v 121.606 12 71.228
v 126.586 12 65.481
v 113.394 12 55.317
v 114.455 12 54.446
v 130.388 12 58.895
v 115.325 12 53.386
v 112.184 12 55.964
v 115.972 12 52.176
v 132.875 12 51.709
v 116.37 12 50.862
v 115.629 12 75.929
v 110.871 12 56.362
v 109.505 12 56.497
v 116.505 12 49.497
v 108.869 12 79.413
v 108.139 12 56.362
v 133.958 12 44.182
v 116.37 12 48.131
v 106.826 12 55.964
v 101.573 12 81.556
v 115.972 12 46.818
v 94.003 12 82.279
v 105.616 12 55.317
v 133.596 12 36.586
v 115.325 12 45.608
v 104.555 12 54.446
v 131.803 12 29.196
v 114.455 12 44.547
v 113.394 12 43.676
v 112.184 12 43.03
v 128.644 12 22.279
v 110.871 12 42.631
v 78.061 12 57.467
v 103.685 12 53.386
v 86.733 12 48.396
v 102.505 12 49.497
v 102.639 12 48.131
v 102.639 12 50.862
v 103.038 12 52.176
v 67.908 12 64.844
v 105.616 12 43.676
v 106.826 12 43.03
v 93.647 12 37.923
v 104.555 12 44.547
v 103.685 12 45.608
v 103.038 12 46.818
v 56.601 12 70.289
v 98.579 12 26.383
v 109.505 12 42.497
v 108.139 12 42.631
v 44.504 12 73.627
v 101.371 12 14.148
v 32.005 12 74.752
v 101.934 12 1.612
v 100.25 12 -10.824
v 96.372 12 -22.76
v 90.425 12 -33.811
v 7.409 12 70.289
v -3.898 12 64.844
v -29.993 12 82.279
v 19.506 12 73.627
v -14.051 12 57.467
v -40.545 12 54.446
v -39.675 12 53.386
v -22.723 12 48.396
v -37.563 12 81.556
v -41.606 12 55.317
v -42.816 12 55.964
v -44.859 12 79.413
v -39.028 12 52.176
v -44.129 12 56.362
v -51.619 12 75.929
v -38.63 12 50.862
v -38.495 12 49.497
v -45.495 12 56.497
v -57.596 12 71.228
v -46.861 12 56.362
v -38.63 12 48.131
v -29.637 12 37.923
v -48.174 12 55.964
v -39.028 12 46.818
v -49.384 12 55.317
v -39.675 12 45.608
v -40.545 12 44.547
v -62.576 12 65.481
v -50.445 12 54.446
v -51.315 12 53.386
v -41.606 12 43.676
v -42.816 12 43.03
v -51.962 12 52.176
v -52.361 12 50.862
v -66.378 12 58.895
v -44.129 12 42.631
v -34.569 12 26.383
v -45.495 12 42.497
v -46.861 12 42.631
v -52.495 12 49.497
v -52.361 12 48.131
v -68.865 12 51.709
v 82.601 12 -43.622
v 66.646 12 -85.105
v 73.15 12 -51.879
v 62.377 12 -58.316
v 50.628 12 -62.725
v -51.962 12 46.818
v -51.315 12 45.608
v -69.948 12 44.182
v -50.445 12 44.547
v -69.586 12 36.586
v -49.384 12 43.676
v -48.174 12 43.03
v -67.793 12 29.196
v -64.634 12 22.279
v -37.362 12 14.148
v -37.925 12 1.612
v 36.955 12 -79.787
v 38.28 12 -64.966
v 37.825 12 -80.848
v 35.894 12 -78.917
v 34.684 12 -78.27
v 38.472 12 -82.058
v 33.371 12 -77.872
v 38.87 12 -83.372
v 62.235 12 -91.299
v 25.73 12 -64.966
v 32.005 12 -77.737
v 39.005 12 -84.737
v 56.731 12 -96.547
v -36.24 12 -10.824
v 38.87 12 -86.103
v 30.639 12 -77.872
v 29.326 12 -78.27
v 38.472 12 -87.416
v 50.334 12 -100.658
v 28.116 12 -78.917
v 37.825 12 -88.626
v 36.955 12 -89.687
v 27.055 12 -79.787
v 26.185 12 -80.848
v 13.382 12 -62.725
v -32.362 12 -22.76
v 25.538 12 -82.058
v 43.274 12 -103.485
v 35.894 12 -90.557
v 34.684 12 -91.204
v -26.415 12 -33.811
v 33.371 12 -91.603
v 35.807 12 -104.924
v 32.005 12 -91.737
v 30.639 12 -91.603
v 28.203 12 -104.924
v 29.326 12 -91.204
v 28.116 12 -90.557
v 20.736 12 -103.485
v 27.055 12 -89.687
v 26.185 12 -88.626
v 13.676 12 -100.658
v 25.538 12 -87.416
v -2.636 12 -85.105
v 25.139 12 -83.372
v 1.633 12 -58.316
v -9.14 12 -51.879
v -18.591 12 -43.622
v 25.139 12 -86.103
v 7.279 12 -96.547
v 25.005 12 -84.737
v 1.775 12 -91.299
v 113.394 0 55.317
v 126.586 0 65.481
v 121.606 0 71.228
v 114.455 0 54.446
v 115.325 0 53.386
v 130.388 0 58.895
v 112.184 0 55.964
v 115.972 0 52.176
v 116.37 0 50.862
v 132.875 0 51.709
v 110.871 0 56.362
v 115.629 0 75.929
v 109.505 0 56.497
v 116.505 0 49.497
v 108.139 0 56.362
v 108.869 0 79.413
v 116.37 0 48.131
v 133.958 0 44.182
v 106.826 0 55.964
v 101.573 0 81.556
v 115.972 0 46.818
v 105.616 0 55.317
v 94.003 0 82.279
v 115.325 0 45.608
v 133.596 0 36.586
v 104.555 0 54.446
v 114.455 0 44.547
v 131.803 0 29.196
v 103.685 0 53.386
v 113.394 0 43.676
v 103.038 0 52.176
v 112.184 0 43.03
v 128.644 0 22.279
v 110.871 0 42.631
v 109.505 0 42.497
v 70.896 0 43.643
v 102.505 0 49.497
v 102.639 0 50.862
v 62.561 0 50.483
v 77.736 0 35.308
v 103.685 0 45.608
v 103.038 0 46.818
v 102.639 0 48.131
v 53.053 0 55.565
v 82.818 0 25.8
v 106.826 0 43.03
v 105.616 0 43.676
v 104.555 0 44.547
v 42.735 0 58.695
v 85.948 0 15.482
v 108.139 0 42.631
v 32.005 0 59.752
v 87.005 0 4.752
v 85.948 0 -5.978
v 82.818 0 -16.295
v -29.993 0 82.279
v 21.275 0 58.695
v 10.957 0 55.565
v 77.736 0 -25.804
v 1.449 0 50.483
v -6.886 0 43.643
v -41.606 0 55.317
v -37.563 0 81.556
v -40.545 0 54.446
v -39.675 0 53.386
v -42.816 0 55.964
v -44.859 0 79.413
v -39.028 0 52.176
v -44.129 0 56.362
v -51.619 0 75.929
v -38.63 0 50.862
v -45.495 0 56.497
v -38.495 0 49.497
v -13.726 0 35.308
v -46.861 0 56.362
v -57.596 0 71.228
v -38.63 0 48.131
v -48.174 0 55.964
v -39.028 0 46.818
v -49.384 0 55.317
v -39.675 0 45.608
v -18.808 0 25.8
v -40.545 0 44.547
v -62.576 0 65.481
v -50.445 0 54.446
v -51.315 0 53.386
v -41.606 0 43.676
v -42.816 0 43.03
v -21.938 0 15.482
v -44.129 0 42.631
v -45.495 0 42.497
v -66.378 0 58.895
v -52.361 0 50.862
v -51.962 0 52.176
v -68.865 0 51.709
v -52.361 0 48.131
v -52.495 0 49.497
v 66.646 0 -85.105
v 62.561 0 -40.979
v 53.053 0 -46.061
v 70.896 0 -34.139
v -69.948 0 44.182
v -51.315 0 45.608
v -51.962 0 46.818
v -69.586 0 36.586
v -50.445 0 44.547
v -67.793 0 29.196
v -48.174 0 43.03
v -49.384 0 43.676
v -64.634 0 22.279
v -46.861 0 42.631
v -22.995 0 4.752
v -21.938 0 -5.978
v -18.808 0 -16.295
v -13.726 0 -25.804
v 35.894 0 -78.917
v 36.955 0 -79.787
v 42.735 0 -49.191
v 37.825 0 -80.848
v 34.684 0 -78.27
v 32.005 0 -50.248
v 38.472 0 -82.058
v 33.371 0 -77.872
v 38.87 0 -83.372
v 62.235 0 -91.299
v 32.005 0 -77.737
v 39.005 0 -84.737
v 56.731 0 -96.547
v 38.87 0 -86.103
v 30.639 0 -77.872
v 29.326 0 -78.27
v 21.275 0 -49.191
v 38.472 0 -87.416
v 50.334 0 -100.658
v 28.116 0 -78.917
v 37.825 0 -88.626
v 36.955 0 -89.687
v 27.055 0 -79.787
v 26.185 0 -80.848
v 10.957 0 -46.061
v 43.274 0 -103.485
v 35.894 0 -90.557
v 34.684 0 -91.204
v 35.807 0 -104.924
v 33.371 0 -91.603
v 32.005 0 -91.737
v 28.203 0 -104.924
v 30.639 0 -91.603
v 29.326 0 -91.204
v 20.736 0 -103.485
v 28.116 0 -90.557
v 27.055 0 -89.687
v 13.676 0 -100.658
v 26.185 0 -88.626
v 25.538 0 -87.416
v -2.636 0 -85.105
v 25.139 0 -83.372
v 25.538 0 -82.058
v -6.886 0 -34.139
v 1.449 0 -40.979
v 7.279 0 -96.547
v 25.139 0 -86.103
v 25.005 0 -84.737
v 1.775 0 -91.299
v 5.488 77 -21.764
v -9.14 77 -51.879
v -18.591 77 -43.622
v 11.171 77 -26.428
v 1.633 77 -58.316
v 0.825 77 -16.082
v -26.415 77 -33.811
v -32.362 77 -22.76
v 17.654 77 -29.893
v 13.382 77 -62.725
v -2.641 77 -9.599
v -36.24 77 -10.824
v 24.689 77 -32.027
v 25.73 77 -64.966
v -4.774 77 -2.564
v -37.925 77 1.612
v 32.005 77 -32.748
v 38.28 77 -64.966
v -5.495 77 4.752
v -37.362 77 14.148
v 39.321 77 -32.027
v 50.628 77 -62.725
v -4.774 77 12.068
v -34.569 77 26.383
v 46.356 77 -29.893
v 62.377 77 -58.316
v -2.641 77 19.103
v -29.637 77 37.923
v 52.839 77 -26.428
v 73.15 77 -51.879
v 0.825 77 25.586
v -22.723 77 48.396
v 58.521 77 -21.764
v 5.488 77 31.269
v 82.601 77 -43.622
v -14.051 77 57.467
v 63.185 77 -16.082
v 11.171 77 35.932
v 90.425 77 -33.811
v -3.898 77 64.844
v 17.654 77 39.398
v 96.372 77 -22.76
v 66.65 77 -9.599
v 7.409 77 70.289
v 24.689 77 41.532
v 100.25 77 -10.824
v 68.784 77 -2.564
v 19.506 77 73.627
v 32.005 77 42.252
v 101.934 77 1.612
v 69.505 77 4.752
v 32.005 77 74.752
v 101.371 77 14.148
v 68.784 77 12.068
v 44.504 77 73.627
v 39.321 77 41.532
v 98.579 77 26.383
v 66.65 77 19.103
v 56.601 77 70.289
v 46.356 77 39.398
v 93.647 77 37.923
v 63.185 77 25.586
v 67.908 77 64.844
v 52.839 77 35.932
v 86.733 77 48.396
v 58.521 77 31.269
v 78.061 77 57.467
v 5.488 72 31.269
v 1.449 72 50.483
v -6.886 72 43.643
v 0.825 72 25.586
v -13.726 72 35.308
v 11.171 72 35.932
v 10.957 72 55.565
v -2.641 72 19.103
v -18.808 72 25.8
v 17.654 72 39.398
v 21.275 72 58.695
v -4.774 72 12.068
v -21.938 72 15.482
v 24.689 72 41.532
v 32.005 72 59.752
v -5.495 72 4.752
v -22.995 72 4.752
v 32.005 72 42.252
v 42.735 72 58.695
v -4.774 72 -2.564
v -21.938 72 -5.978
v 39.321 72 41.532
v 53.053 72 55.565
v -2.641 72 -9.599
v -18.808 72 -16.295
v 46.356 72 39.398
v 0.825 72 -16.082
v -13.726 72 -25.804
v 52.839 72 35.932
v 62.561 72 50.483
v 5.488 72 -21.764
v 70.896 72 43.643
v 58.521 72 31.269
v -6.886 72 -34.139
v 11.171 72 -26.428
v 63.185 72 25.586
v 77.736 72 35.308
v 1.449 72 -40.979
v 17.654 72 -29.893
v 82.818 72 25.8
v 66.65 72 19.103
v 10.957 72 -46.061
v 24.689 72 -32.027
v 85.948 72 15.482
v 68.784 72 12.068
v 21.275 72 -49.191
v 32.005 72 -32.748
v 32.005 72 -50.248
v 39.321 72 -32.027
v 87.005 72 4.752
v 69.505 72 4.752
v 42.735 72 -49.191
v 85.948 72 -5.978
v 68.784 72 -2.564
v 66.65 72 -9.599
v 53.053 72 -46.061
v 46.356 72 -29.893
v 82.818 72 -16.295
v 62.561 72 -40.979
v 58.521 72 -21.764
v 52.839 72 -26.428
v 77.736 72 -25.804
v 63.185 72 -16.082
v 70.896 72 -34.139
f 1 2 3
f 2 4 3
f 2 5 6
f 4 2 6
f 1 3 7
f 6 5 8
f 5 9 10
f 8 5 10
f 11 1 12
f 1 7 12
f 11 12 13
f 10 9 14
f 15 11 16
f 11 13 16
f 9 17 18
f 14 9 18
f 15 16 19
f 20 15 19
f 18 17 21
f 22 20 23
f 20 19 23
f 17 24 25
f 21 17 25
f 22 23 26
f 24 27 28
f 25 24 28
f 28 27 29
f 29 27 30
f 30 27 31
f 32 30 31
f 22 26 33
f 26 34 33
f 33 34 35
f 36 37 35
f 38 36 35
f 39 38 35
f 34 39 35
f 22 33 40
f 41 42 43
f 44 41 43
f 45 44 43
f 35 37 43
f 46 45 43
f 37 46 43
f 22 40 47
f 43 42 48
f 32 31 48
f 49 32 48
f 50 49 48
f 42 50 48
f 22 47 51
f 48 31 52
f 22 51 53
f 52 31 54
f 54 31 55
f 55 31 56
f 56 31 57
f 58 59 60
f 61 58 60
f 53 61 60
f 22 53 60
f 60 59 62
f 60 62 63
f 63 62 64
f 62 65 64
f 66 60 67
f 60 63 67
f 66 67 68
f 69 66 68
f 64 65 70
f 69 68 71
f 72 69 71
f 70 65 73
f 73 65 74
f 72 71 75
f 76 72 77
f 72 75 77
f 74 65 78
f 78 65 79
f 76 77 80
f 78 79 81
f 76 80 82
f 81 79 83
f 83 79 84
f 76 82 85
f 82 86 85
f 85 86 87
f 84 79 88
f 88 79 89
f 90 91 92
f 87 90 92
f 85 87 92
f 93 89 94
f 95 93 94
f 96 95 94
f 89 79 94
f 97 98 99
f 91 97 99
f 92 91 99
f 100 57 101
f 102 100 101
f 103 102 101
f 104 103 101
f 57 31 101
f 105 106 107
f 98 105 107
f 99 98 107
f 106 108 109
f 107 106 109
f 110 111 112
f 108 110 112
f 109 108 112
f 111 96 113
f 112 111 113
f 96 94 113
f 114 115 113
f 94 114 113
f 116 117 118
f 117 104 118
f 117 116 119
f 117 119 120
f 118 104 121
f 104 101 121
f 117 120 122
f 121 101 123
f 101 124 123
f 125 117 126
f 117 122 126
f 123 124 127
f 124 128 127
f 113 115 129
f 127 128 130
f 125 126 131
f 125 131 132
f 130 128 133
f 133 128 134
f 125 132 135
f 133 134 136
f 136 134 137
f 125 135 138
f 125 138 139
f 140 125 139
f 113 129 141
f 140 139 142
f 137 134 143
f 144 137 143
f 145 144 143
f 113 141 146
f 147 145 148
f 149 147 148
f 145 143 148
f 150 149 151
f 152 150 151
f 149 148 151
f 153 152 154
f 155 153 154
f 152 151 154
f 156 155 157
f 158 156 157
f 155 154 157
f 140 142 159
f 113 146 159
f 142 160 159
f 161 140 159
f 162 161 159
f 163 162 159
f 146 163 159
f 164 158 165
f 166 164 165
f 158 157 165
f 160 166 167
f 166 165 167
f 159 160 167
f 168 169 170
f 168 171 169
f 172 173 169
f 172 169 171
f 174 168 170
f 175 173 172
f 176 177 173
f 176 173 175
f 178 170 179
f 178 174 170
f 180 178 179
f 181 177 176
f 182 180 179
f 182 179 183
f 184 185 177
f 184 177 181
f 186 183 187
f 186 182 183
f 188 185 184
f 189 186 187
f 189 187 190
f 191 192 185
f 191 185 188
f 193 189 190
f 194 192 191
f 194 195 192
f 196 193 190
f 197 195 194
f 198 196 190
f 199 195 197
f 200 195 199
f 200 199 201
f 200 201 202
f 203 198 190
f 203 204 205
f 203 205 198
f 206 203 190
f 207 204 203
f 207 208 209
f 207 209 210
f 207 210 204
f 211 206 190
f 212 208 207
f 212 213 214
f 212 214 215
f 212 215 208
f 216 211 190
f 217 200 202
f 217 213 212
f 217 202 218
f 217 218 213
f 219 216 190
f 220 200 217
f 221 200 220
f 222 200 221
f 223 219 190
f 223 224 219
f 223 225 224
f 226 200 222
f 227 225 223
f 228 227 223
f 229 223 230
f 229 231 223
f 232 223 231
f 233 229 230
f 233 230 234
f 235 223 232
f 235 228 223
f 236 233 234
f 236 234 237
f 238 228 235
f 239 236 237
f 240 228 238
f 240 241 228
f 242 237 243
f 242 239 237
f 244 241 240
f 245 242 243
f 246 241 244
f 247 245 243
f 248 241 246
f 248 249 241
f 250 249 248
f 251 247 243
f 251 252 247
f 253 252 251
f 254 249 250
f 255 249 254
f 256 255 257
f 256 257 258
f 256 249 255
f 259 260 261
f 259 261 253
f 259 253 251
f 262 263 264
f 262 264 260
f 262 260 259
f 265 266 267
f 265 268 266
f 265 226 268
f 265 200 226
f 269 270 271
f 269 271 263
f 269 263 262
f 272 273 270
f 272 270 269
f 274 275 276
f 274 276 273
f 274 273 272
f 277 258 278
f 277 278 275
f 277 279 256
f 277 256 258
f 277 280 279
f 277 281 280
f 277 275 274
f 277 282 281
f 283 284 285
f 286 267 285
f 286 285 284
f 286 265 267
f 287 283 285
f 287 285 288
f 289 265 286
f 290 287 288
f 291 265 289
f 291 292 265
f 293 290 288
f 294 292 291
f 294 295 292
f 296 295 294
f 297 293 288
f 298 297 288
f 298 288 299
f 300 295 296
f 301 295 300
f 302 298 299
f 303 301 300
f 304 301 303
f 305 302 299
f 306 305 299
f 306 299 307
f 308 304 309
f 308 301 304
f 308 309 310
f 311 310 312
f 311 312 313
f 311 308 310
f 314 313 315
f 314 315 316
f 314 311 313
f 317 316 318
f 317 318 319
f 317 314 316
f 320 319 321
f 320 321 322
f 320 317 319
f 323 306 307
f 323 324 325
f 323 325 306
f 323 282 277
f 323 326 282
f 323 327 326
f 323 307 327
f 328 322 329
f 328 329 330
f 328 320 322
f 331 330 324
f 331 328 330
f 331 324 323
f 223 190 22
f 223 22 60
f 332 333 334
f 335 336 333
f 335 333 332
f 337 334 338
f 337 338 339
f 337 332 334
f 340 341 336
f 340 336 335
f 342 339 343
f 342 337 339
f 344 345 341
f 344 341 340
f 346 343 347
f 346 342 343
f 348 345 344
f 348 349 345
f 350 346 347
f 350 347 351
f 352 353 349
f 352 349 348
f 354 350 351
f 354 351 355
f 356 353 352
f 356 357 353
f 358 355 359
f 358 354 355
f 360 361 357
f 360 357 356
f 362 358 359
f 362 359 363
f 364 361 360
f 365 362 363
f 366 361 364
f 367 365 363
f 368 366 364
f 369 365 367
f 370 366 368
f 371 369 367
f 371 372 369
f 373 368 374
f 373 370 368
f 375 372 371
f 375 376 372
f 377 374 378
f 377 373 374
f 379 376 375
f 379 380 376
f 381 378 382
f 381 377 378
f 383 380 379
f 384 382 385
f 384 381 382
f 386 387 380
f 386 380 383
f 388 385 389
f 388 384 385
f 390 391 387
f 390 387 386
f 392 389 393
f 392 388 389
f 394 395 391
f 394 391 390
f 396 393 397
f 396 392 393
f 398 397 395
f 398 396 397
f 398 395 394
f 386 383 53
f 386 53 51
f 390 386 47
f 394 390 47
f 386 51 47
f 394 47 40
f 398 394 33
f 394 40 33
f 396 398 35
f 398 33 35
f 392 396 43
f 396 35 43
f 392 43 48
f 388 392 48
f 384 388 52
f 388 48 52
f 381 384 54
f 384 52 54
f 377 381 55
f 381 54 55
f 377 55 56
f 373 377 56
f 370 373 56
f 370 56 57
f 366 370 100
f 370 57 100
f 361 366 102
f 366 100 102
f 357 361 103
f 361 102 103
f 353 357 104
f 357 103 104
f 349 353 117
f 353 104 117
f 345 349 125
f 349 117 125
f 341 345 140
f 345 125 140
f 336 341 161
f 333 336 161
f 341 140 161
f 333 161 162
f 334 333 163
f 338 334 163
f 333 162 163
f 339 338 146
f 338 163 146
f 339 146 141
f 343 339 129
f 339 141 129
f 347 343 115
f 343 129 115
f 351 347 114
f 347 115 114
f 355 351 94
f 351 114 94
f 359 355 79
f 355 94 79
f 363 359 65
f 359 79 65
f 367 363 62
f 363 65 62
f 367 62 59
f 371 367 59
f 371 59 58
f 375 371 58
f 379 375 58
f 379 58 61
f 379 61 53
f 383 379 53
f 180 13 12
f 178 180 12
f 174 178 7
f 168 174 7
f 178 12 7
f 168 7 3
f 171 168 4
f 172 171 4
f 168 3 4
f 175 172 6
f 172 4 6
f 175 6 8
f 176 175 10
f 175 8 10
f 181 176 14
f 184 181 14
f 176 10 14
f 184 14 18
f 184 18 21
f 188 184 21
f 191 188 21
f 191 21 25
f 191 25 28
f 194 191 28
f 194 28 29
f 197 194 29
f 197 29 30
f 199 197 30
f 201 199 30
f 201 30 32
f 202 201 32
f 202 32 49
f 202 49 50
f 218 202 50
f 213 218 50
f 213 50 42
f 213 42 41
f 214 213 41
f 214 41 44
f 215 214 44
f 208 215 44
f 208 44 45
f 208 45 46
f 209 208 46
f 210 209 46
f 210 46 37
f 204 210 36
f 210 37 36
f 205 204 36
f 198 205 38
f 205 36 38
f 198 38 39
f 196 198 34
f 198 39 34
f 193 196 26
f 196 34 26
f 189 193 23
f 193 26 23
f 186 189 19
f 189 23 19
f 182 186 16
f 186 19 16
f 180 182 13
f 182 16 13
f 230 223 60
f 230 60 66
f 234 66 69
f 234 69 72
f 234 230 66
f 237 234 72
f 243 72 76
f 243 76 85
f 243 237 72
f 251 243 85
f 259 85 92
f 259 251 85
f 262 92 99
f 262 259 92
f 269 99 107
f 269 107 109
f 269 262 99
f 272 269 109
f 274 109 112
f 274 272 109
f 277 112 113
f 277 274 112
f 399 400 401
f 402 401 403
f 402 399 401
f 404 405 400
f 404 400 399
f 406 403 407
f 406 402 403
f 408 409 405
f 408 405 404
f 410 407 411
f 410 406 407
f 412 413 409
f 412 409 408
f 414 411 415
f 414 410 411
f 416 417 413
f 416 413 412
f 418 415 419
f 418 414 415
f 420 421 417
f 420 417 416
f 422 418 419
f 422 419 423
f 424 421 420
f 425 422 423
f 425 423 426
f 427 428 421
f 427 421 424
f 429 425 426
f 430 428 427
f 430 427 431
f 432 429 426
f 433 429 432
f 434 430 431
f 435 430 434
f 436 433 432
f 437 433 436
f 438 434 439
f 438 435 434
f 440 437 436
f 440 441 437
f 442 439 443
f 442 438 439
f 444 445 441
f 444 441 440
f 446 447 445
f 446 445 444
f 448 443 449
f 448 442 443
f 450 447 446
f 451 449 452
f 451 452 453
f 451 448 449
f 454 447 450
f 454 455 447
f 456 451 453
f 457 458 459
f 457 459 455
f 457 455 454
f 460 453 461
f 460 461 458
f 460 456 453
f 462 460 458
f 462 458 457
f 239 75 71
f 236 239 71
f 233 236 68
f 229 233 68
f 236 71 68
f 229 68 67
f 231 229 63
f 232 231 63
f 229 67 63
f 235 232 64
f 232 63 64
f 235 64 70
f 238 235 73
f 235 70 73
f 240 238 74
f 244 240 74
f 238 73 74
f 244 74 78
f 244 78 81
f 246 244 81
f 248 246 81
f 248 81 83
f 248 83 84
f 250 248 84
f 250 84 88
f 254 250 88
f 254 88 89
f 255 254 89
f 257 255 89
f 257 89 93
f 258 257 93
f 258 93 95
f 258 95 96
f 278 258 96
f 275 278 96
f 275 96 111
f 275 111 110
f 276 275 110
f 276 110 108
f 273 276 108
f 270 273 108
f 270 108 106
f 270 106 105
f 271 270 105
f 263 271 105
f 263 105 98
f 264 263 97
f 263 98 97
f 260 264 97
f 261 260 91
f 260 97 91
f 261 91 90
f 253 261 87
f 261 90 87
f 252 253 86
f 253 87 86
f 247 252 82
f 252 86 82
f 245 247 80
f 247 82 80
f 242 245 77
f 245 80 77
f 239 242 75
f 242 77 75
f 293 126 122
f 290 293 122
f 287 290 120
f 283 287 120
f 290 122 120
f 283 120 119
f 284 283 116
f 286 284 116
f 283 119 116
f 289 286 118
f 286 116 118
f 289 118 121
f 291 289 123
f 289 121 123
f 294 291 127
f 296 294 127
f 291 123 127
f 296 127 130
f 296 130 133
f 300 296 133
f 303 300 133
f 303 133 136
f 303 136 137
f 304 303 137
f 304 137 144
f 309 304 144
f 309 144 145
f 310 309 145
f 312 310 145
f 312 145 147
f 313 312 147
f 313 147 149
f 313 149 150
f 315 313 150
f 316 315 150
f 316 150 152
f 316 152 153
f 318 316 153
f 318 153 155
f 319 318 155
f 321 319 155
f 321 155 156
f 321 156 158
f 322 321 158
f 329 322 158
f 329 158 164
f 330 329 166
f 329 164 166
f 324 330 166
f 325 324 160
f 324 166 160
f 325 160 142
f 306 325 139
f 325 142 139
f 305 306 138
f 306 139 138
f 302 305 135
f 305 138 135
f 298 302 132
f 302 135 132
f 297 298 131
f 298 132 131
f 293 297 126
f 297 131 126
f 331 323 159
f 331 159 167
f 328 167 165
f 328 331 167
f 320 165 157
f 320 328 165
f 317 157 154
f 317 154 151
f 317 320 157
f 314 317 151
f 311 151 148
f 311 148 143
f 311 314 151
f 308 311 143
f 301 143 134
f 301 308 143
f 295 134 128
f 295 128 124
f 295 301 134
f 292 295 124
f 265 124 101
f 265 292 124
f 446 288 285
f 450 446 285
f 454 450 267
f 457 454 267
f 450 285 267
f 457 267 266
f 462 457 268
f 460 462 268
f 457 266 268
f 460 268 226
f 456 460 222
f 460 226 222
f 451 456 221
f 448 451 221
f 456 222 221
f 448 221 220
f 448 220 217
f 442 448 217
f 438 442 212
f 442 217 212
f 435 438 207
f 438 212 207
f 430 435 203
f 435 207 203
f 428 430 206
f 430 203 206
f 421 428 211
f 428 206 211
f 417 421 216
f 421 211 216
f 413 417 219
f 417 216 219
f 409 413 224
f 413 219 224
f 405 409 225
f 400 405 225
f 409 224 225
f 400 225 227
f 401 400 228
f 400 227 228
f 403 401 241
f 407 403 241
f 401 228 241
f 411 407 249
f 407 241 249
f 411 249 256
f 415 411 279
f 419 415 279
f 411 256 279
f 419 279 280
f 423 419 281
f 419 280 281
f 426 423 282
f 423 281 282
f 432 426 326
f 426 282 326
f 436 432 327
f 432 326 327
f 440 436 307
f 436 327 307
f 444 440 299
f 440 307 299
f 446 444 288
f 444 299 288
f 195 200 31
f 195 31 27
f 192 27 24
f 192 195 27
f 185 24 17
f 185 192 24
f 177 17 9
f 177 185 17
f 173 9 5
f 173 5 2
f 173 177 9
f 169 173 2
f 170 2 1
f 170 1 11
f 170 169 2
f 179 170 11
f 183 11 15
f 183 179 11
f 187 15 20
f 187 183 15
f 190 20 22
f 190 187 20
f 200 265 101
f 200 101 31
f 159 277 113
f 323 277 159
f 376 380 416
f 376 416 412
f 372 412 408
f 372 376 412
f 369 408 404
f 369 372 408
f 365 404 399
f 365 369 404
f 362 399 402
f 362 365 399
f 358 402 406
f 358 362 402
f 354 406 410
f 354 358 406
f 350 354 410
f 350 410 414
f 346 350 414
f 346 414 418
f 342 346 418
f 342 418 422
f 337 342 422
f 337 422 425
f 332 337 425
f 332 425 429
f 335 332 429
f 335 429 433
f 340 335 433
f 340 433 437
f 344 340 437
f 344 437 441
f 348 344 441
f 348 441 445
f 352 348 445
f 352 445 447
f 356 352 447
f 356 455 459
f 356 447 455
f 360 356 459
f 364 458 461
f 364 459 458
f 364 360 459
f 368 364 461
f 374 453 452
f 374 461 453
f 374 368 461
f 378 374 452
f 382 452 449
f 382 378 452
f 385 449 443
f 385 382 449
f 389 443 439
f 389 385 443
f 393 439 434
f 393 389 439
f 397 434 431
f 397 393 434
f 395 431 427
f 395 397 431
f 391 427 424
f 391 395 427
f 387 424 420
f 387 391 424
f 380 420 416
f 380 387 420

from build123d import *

# Parameters (mm, degrees)
BOSS_EXTRUDE1_DEPTH = 12
SKETCH2_R           = 37.5
CUT_EXTRUDE1_DEPTH  = 22
SKETCH5_R           = 7
CUT_EXTRUDE3_DEPTH  = 22
SKETCH6_R           = 70
BOSS_EXTRUDE2_DEPTH = 65
CUT_EXTRUDE4_START  = -80
SKETCH7_R           = 37.5
CUT_EXTRUDE4_DEPTH  = 80
SKETCH9_R           = 55
CUT_EXTRUDE5_DEPTH  = 72


with BuildPart() as part:
    # Sketch1 → Boss-Extrude1 (new body)
    with BuildSketch(Plane(origin=(0, 0, 0), x_dir=(1, 0, 0), z_dir=(0, 1, 0))):
        with BuildLine():
            Line((66.645984298, 85.104941493), (128.643951995, -22.278688525))
            ThreePointArc((128.643951995, -22.278688525), (128.643951995, -62.278688525), (94.002935844, -82.278688525))
            Line((94.002935844, -82.278688525), (-29.992999551, -82.278688525))
            ThreePointArc((-29.992999551, -82.278688525), (-64.634015702, -62.278688525), (-64.634015702, -22.278688525))
            Line((-64.634015702, -22.278688525), (-2.636048005, 85.104941493))
            ThreePointArc((-2.636048005, 85.104941493), (32.004968146, 105.104941493), (66.645984298, 85.104941493))
        make_face()
    extrude(amount=BOSS_EXTRUDE1_DEPTH)

    # Sketch2 → Cut-Extrude1 (cut)
    with BuildSketch(Plane(origin=(0, 12, 0), x_dir=(1, 0, 0), z_dir=(0, 1, 0))):
        with Locations(Location((32.004968146, -4.752094378, 0), (0, 0, 270))):
            Circle(SKETCH2_R)
    extrude(amount=-CUT_EXTRUDE1_DEPTH, mode=Mode.SUBTRACT)

    # Sketch5 → Cut-Extrude3 (cut)
    with BuildSketch(Plane(origin=(0, 12, 0), x_dir=(1, 0, 0), z_dir=(0, 1, 0))):
        with Locations(Location((109.504968146, -49.49674024, 0), (0, 0, 270))):
            Circle(SKETCH5_R)
        with Locations(Location((32.004968146, 84.737197347, 0), (0, 0, 270))):
            Circle(SKETCH5_R)
        with Locations(Location((-45.495031854, -49.49674024, 0), (0, 0, 270))):
            Circle(SKETCH5_R)
    extrude(amount=-CUT_EXTRUDE3_DEPTH, mode=Mode.SUBTRACT)

    # Sketch6 → Boss-Extrude2 (add)
    with BuildSketch(Plane(origin=(0, 12, 0), x_dir=(1, 0, 0), z_dir=(0, 1, 0))):
        with Locations(Location((32.004968146, -4.752094378, 0), (0, 0, 270))):
            Circle(SKETCH6_R)
    extrude(amount=BOSS_EXTRUDE2_DEPTH)

    # Sketch7 → Cut-Extrude4 (cut)
    with BuildSketch(Plane(origin=(0, 12, 0), x_dir=(-1, 0, 0), z_dir=(0, -1, 0)).offset(CUT_EXTRUDE4_START)):
        with Locations(Location((-32.004968146, -4.752094378, 0), (0, 0, 270))):
            Circle(SKETCH7_R)
    extrude(amount=CUT_EXTRUDE4_DEPTH, mode=Mode.SUBTRACT)

    # Sketch9 → Cut-Extrude5 (cut)
    with BuildSketch(Plane(origin=(0, 0, 0), x_dir=(-1, 0, 0), z_dir=(0, -1, 0))):
        with Locations(Location((-32.004968146, -4.752094378, 0), (0, 0, 90))):
            Circle(SKETCH9_R)
    extrude(amount=-CUT_EXTRUDE5_DEPTH, mode=Mode.SUBTRACT)


solid = part.part
